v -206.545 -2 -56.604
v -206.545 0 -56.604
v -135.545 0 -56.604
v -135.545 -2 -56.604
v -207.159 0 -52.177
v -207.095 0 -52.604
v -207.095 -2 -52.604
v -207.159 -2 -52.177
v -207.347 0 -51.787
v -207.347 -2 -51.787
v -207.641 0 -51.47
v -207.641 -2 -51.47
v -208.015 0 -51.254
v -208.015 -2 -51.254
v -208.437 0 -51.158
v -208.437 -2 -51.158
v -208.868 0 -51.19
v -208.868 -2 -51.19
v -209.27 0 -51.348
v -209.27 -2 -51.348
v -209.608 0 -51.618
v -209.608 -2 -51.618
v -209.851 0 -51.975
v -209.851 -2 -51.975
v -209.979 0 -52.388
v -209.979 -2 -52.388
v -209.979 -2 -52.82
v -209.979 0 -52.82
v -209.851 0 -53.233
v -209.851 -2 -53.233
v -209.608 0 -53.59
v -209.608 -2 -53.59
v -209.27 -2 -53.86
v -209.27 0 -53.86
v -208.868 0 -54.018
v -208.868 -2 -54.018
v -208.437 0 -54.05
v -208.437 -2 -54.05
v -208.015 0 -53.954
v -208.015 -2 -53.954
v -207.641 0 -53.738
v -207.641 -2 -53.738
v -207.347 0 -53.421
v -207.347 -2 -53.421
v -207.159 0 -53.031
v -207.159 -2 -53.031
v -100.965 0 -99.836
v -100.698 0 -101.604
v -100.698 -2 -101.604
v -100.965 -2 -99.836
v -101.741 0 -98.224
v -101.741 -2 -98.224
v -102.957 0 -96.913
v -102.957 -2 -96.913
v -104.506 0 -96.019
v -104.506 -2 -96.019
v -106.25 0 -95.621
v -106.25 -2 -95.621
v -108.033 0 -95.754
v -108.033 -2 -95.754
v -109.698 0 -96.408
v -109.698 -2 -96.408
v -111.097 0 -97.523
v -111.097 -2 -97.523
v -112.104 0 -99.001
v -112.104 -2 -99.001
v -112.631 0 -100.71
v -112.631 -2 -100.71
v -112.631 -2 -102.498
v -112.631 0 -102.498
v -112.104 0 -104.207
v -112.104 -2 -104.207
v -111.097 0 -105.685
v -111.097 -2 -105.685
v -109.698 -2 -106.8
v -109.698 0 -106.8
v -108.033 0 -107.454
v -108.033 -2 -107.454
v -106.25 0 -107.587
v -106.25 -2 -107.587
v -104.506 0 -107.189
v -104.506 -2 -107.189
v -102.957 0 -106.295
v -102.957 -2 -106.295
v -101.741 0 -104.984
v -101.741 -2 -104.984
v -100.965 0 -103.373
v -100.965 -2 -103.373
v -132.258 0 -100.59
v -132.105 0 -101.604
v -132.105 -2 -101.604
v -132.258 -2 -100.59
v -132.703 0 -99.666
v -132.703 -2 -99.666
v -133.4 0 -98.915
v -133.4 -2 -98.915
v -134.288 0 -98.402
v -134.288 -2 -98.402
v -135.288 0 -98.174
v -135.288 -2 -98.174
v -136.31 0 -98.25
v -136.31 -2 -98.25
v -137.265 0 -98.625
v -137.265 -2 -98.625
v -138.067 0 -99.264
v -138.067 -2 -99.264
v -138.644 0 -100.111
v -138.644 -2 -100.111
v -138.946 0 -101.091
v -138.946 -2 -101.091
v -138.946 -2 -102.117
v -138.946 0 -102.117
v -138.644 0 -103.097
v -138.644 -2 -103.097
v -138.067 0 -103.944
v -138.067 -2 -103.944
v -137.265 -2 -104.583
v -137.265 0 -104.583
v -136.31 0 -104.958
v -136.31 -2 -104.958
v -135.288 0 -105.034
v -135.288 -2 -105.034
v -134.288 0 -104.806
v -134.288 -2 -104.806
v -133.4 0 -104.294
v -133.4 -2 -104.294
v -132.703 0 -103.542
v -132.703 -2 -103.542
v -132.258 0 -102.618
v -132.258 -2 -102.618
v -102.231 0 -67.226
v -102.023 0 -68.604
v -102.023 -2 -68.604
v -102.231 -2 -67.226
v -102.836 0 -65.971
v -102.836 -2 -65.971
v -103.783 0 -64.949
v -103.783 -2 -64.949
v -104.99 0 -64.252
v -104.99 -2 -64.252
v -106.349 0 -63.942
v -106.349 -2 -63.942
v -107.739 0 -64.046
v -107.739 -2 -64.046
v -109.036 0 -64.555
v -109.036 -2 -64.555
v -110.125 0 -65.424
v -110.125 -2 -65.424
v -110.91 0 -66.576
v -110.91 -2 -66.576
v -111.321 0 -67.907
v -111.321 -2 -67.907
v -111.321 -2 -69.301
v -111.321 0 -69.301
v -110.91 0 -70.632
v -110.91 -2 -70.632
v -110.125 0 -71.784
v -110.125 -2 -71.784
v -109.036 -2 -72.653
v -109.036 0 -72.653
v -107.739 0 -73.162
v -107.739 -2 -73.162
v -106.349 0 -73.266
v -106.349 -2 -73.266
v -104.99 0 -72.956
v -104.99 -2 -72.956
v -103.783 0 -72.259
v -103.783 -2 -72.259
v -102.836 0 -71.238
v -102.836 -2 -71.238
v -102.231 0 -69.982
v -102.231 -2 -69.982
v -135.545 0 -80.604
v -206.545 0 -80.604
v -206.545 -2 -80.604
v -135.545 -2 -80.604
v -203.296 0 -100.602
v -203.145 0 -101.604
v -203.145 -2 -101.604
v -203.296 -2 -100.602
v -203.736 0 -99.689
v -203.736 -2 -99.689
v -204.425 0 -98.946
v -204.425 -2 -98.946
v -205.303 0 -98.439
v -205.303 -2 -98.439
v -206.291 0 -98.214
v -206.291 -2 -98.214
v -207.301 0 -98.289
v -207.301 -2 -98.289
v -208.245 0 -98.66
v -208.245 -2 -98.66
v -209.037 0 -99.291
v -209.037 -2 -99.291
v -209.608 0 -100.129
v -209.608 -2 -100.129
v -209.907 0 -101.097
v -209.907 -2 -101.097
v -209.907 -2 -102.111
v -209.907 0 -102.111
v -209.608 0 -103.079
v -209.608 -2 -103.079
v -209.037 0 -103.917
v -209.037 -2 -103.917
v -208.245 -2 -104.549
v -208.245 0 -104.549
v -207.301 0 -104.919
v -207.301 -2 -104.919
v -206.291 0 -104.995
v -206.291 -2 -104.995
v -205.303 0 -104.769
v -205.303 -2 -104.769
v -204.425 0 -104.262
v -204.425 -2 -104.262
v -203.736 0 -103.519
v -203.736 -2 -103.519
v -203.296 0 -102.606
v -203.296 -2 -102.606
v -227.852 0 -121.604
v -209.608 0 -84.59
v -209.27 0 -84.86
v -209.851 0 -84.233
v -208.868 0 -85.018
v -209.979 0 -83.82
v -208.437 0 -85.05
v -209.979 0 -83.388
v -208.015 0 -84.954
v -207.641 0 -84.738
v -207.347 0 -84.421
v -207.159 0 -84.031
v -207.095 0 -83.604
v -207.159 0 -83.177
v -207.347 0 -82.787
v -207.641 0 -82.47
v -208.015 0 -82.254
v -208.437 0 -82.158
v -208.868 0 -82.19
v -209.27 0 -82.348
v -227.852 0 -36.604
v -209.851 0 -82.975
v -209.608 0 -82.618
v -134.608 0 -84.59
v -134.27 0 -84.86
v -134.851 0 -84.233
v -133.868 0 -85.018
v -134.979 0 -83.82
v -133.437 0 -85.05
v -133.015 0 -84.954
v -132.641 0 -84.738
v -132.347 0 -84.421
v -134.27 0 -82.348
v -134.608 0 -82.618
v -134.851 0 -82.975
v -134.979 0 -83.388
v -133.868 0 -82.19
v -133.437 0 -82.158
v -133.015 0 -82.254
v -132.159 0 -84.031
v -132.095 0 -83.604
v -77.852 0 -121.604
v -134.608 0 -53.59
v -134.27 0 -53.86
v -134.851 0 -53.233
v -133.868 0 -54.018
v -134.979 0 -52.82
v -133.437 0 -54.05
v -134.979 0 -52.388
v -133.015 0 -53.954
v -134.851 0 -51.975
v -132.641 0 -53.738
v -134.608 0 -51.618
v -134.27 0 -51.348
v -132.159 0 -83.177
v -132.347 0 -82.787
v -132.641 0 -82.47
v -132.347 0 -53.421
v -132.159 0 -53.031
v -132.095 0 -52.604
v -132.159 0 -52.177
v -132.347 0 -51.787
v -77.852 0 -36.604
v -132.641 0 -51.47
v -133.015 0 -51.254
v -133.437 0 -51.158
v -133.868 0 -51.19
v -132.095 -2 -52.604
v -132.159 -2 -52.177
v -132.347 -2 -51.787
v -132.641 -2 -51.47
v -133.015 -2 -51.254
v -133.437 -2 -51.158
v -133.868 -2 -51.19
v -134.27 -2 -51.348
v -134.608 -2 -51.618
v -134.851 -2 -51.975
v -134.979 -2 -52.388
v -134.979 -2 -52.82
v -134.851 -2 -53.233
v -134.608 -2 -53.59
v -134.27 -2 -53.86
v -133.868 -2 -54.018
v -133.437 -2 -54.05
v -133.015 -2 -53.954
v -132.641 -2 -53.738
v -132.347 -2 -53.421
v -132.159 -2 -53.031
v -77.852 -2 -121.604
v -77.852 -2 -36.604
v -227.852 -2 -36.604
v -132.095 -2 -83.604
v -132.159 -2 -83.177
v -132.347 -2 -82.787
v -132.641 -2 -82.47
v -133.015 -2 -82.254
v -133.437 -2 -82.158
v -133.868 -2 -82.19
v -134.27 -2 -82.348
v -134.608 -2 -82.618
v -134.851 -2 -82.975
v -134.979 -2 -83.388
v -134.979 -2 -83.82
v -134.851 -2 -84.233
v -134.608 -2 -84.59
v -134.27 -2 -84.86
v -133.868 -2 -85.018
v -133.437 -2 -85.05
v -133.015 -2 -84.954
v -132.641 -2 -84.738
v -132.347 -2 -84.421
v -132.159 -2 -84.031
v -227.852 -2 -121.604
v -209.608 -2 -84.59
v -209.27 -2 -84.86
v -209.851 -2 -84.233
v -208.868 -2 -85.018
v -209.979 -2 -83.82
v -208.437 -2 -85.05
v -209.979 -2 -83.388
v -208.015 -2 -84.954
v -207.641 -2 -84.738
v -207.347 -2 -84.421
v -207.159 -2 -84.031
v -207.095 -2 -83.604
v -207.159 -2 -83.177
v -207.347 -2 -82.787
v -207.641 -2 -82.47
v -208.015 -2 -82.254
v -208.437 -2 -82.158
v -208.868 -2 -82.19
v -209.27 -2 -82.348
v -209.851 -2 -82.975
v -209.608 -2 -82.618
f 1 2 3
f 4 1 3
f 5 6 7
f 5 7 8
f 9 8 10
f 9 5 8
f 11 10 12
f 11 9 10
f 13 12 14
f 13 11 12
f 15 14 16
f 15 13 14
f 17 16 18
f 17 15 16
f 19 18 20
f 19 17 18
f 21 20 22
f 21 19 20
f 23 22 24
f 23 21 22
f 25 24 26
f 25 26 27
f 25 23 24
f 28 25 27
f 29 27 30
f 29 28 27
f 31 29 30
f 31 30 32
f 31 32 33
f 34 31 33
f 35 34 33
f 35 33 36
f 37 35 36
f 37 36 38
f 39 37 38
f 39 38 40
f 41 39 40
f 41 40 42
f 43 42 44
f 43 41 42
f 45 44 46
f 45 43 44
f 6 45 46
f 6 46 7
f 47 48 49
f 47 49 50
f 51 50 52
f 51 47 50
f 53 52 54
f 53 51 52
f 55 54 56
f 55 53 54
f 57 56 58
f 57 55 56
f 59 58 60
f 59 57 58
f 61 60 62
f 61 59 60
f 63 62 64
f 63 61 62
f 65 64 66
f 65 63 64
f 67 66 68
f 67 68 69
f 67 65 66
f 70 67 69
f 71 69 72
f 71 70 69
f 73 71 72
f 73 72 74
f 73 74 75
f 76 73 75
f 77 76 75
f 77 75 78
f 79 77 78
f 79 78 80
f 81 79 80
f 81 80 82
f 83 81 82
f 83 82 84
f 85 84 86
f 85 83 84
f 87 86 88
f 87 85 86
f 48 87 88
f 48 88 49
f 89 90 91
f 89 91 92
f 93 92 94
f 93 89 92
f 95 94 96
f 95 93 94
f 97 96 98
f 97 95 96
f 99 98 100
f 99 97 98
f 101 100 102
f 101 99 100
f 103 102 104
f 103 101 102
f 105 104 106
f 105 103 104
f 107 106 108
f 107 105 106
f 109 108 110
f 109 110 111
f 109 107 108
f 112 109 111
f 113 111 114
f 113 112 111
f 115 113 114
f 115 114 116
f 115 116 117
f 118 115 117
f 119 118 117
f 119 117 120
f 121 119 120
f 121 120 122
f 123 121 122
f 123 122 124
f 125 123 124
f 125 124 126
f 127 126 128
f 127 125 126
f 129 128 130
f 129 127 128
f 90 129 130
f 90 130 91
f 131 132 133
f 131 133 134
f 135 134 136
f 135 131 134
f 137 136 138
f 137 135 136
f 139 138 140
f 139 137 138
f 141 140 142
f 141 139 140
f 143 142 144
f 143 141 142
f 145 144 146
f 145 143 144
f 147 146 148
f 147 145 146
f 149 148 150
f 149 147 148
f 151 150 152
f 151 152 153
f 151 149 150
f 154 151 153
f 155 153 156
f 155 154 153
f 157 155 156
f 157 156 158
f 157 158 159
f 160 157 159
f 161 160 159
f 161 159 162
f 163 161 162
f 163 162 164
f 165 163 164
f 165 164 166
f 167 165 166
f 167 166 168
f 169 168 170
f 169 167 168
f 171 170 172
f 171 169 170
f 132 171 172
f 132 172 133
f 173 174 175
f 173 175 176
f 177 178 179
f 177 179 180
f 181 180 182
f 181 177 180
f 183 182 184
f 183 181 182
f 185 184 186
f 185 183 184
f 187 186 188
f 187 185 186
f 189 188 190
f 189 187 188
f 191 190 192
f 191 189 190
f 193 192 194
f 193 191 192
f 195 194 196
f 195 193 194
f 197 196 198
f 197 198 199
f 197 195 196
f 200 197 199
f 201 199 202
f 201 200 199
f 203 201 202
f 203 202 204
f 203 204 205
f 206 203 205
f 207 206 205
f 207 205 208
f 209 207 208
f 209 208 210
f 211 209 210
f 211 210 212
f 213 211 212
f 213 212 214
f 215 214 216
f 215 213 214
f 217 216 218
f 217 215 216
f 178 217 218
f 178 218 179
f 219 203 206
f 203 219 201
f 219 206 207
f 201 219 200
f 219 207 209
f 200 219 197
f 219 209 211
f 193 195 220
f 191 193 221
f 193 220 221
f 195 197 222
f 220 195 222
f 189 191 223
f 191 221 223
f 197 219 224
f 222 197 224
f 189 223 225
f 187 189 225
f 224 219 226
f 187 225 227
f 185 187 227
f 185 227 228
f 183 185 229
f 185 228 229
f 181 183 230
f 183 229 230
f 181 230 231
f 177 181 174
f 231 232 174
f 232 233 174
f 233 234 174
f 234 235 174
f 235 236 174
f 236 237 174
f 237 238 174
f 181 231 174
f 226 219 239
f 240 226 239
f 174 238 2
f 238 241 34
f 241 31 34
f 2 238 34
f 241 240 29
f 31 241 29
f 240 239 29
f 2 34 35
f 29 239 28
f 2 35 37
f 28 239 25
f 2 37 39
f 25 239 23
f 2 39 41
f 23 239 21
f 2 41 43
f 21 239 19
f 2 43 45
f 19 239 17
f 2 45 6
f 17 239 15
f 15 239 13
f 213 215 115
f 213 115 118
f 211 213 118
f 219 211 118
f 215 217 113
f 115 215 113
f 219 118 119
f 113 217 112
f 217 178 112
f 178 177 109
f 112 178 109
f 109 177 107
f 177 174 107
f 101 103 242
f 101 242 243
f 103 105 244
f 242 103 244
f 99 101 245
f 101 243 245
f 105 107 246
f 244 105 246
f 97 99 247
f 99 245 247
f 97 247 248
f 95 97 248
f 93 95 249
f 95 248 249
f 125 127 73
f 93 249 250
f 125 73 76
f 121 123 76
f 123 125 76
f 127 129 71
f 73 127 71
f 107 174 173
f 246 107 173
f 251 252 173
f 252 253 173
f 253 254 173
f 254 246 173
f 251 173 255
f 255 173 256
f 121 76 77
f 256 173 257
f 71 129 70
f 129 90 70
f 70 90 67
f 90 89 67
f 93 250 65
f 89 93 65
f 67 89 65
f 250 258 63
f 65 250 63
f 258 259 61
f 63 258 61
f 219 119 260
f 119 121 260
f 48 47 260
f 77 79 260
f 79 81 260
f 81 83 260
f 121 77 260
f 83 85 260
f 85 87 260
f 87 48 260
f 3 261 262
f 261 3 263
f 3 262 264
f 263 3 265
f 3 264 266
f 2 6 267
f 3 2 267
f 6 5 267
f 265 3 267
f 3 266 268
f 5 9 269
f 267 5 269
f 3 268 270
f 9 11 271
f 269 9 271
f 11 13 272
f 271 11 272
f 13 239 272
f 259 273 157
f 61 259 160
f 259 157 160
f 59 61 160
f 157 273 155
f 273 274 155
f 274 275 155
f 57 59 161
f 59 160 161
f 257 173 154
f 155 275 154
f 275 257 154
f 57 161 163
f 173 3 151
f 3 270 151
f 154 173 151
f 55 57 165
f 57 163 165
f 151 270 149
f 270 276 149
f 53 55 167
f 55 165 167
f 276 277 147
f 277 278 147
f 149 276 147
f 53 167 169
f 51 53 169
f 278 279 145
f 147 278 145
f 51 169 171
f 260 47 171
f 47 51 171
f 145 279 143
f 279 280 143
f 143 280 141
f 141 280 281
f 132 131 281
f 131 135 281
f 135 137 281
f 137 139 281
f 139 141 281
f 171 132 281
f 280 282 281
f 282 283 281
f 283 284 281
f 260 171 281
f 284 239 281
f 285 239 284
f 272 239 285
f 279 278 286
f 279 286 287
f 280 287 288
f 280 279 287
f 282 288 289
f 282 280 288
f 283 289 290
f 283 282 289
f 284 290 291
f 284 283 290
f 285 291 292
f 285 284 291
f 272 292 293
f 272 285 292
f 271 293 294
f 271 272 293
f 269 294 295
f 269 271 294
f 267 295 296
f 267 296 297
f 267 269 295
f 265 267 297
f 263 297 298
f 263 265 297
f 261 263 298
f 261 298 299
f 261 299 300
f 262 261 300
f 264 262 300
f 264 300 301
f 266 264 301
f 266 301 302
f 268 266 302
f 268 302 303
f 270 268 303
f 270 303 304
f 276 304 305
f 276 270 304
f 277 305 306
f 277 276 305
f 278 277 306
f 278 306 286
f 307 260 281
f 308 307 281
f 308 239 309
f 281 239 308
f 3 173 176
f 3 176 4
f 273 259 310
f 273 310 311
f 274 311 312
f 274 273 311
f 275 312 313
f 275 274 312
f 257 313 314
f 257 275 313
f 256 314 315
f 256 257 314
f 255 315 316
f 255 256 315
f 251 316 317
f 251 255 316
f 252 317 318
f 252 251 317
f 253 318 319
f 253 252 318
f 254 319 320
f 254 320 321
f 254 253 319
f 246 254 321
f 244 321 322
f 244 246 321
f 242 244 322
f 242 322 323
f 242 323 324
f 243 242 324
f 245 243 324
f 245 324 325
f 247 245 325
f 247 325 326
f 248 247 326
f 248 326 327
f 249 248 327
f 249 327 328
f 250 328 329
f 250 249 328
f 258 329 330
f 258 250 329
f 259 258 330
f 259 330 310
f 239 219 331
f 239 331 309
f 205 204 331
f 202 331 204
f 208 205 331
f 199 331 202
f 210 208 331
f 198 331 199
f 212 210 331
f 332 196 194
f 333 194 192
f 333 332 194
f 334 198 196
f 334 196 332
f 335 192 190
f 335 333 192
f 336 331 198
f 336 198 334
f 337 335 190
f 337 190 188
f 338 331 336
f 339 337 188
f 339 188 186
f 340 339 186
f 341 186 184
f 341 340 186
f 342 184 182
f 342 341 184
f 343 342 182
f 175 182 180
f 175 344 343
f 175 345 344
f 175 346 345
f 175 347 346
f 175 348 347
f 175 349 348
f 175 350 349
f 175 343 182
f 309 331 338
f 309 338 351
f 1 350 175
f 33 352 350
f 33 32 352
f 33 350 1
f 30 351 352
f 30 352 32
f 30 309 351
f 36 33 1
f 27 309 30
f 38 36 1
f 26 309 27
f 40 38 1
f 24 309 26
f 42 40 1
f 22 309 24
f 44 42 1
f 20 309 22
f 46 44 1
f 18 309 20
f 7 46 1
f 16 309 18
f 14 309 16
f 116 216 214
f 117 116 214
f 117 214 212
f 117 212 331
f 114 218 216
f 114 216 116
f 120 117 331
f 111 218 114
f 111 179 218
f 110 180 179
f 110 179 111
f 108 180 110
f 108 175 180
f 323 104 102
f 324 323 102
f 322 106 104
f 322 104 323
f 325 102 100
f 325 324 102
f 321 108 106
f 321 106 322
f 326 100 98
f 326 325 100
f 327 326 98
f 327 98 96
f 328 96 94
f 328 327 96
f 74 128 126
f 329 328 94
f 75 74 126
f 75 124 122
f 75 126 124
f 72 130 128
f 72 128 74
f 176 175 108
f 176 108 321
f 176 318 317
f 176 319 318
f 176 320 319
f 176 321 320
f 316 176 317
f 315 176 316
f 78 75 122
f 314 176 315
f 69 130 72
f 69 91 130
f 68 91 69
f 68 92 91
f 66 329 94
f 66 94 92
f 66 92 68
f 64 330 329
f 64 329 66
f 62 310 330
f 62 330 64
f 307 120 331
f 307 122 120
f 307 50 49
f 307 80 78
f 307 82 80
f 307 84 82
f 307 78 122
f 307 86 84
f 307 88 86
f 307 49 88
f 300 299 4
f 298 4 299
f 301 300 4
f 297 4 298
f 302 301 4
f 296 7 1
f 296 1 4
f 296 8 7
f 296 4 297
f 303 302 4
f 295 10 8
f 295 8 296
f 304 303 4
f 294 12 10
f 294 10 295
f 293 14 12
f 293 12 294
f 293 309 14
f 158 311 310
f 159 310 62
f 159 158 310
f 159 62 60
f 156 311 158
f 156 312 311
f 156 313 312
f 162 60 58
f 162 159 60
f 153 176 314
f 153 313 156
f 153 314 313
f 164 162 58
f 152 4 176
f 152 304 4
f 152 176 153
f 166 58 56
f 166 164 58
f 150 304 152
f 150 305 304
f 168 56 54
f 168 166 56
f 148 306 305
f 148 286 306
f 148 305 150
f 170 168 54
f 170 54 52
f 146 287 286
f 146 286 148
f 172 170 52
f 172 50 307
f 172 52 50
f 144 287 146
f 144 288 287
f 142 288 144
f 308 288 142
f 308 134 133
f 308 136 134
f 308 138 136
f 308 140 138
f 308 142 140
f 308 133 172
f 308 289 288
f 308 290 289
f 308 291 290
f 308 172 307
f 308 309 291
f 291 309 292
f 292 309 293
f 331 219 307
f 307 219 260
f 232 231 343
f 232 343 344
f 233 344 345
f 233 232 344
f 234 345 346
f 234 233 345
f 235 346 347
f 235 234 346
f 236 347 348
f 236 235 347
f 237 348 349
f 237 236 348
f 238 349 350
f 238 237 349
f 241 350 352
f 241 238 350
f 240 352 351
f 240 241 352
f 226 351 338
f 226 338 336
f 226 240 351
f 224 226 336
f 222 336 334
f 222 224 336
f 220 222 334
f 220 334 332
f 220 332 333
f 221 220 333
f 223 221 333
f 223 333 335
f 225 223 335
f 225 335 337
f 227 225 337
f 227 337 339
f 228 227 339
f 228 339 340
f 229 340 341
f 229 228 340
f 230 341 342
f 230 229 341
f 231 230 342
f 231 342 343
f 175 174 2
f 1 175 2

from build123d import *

# Parameters (mm, degrees)
F0_W     = 150
F0_H     = 85
F0_R     = 3.4
F0_R_2   = 1.45
F0_R_3   = 3.44
F0_R_4   = 6
F0_W_2   = 71
F0_H_2   = 24
F0_R_5   = 4.675
F1_DEPTH = 2


with BuildPart() as f1:
    # F0 (on Front) → F1 (new body)
    with BuildSketch(Plane.XZ):
        with Locations((-152.851582, -79.104053)):
            Rectangle(F0_W, F0_H)
        with Locations((-206.544898, -101.604053)):
            Circle(F0_R, mode=Mode.SUBTRACT)
        with Locations((-208.544898, -83.604053)):
            Circle(F0_R_2, mode=Mode.SUBTRACT)
        with Locations((-135.544898, -101.604053)):
            Circle(F0_R_3, mode=Mode.SUBTRACT)
        with Locations((-106.69824, -101.604053)):
            Circle(F0_R_4, mode=Mode.SUBTRACT)
        with Locations((-133.544898, -83.604053)):
            Circle(F0_R_2, mode=Mode.SUBTRACT)
        with Locations((-171.044898, -68.604053)):
            Rectangle(F0_W_2, F0_H_2, mode=Mode.SUBTRACT)
        with Locations((-208.544898, -52.604053)):
            Circle(F0_R_2, mode=Mode.SUBTRACT)
        with Locations((-106.69824, -68.604053)):
            Circle(F0_R_5, mode=Mode.SUBTRACT)
        with Locations((-133.544898, -52.604053)):
            Circle(F0_R_2, mode=Mode.SUBTRACT)
    extrude(amount=F1_DEPTH)


solid = f1.part
